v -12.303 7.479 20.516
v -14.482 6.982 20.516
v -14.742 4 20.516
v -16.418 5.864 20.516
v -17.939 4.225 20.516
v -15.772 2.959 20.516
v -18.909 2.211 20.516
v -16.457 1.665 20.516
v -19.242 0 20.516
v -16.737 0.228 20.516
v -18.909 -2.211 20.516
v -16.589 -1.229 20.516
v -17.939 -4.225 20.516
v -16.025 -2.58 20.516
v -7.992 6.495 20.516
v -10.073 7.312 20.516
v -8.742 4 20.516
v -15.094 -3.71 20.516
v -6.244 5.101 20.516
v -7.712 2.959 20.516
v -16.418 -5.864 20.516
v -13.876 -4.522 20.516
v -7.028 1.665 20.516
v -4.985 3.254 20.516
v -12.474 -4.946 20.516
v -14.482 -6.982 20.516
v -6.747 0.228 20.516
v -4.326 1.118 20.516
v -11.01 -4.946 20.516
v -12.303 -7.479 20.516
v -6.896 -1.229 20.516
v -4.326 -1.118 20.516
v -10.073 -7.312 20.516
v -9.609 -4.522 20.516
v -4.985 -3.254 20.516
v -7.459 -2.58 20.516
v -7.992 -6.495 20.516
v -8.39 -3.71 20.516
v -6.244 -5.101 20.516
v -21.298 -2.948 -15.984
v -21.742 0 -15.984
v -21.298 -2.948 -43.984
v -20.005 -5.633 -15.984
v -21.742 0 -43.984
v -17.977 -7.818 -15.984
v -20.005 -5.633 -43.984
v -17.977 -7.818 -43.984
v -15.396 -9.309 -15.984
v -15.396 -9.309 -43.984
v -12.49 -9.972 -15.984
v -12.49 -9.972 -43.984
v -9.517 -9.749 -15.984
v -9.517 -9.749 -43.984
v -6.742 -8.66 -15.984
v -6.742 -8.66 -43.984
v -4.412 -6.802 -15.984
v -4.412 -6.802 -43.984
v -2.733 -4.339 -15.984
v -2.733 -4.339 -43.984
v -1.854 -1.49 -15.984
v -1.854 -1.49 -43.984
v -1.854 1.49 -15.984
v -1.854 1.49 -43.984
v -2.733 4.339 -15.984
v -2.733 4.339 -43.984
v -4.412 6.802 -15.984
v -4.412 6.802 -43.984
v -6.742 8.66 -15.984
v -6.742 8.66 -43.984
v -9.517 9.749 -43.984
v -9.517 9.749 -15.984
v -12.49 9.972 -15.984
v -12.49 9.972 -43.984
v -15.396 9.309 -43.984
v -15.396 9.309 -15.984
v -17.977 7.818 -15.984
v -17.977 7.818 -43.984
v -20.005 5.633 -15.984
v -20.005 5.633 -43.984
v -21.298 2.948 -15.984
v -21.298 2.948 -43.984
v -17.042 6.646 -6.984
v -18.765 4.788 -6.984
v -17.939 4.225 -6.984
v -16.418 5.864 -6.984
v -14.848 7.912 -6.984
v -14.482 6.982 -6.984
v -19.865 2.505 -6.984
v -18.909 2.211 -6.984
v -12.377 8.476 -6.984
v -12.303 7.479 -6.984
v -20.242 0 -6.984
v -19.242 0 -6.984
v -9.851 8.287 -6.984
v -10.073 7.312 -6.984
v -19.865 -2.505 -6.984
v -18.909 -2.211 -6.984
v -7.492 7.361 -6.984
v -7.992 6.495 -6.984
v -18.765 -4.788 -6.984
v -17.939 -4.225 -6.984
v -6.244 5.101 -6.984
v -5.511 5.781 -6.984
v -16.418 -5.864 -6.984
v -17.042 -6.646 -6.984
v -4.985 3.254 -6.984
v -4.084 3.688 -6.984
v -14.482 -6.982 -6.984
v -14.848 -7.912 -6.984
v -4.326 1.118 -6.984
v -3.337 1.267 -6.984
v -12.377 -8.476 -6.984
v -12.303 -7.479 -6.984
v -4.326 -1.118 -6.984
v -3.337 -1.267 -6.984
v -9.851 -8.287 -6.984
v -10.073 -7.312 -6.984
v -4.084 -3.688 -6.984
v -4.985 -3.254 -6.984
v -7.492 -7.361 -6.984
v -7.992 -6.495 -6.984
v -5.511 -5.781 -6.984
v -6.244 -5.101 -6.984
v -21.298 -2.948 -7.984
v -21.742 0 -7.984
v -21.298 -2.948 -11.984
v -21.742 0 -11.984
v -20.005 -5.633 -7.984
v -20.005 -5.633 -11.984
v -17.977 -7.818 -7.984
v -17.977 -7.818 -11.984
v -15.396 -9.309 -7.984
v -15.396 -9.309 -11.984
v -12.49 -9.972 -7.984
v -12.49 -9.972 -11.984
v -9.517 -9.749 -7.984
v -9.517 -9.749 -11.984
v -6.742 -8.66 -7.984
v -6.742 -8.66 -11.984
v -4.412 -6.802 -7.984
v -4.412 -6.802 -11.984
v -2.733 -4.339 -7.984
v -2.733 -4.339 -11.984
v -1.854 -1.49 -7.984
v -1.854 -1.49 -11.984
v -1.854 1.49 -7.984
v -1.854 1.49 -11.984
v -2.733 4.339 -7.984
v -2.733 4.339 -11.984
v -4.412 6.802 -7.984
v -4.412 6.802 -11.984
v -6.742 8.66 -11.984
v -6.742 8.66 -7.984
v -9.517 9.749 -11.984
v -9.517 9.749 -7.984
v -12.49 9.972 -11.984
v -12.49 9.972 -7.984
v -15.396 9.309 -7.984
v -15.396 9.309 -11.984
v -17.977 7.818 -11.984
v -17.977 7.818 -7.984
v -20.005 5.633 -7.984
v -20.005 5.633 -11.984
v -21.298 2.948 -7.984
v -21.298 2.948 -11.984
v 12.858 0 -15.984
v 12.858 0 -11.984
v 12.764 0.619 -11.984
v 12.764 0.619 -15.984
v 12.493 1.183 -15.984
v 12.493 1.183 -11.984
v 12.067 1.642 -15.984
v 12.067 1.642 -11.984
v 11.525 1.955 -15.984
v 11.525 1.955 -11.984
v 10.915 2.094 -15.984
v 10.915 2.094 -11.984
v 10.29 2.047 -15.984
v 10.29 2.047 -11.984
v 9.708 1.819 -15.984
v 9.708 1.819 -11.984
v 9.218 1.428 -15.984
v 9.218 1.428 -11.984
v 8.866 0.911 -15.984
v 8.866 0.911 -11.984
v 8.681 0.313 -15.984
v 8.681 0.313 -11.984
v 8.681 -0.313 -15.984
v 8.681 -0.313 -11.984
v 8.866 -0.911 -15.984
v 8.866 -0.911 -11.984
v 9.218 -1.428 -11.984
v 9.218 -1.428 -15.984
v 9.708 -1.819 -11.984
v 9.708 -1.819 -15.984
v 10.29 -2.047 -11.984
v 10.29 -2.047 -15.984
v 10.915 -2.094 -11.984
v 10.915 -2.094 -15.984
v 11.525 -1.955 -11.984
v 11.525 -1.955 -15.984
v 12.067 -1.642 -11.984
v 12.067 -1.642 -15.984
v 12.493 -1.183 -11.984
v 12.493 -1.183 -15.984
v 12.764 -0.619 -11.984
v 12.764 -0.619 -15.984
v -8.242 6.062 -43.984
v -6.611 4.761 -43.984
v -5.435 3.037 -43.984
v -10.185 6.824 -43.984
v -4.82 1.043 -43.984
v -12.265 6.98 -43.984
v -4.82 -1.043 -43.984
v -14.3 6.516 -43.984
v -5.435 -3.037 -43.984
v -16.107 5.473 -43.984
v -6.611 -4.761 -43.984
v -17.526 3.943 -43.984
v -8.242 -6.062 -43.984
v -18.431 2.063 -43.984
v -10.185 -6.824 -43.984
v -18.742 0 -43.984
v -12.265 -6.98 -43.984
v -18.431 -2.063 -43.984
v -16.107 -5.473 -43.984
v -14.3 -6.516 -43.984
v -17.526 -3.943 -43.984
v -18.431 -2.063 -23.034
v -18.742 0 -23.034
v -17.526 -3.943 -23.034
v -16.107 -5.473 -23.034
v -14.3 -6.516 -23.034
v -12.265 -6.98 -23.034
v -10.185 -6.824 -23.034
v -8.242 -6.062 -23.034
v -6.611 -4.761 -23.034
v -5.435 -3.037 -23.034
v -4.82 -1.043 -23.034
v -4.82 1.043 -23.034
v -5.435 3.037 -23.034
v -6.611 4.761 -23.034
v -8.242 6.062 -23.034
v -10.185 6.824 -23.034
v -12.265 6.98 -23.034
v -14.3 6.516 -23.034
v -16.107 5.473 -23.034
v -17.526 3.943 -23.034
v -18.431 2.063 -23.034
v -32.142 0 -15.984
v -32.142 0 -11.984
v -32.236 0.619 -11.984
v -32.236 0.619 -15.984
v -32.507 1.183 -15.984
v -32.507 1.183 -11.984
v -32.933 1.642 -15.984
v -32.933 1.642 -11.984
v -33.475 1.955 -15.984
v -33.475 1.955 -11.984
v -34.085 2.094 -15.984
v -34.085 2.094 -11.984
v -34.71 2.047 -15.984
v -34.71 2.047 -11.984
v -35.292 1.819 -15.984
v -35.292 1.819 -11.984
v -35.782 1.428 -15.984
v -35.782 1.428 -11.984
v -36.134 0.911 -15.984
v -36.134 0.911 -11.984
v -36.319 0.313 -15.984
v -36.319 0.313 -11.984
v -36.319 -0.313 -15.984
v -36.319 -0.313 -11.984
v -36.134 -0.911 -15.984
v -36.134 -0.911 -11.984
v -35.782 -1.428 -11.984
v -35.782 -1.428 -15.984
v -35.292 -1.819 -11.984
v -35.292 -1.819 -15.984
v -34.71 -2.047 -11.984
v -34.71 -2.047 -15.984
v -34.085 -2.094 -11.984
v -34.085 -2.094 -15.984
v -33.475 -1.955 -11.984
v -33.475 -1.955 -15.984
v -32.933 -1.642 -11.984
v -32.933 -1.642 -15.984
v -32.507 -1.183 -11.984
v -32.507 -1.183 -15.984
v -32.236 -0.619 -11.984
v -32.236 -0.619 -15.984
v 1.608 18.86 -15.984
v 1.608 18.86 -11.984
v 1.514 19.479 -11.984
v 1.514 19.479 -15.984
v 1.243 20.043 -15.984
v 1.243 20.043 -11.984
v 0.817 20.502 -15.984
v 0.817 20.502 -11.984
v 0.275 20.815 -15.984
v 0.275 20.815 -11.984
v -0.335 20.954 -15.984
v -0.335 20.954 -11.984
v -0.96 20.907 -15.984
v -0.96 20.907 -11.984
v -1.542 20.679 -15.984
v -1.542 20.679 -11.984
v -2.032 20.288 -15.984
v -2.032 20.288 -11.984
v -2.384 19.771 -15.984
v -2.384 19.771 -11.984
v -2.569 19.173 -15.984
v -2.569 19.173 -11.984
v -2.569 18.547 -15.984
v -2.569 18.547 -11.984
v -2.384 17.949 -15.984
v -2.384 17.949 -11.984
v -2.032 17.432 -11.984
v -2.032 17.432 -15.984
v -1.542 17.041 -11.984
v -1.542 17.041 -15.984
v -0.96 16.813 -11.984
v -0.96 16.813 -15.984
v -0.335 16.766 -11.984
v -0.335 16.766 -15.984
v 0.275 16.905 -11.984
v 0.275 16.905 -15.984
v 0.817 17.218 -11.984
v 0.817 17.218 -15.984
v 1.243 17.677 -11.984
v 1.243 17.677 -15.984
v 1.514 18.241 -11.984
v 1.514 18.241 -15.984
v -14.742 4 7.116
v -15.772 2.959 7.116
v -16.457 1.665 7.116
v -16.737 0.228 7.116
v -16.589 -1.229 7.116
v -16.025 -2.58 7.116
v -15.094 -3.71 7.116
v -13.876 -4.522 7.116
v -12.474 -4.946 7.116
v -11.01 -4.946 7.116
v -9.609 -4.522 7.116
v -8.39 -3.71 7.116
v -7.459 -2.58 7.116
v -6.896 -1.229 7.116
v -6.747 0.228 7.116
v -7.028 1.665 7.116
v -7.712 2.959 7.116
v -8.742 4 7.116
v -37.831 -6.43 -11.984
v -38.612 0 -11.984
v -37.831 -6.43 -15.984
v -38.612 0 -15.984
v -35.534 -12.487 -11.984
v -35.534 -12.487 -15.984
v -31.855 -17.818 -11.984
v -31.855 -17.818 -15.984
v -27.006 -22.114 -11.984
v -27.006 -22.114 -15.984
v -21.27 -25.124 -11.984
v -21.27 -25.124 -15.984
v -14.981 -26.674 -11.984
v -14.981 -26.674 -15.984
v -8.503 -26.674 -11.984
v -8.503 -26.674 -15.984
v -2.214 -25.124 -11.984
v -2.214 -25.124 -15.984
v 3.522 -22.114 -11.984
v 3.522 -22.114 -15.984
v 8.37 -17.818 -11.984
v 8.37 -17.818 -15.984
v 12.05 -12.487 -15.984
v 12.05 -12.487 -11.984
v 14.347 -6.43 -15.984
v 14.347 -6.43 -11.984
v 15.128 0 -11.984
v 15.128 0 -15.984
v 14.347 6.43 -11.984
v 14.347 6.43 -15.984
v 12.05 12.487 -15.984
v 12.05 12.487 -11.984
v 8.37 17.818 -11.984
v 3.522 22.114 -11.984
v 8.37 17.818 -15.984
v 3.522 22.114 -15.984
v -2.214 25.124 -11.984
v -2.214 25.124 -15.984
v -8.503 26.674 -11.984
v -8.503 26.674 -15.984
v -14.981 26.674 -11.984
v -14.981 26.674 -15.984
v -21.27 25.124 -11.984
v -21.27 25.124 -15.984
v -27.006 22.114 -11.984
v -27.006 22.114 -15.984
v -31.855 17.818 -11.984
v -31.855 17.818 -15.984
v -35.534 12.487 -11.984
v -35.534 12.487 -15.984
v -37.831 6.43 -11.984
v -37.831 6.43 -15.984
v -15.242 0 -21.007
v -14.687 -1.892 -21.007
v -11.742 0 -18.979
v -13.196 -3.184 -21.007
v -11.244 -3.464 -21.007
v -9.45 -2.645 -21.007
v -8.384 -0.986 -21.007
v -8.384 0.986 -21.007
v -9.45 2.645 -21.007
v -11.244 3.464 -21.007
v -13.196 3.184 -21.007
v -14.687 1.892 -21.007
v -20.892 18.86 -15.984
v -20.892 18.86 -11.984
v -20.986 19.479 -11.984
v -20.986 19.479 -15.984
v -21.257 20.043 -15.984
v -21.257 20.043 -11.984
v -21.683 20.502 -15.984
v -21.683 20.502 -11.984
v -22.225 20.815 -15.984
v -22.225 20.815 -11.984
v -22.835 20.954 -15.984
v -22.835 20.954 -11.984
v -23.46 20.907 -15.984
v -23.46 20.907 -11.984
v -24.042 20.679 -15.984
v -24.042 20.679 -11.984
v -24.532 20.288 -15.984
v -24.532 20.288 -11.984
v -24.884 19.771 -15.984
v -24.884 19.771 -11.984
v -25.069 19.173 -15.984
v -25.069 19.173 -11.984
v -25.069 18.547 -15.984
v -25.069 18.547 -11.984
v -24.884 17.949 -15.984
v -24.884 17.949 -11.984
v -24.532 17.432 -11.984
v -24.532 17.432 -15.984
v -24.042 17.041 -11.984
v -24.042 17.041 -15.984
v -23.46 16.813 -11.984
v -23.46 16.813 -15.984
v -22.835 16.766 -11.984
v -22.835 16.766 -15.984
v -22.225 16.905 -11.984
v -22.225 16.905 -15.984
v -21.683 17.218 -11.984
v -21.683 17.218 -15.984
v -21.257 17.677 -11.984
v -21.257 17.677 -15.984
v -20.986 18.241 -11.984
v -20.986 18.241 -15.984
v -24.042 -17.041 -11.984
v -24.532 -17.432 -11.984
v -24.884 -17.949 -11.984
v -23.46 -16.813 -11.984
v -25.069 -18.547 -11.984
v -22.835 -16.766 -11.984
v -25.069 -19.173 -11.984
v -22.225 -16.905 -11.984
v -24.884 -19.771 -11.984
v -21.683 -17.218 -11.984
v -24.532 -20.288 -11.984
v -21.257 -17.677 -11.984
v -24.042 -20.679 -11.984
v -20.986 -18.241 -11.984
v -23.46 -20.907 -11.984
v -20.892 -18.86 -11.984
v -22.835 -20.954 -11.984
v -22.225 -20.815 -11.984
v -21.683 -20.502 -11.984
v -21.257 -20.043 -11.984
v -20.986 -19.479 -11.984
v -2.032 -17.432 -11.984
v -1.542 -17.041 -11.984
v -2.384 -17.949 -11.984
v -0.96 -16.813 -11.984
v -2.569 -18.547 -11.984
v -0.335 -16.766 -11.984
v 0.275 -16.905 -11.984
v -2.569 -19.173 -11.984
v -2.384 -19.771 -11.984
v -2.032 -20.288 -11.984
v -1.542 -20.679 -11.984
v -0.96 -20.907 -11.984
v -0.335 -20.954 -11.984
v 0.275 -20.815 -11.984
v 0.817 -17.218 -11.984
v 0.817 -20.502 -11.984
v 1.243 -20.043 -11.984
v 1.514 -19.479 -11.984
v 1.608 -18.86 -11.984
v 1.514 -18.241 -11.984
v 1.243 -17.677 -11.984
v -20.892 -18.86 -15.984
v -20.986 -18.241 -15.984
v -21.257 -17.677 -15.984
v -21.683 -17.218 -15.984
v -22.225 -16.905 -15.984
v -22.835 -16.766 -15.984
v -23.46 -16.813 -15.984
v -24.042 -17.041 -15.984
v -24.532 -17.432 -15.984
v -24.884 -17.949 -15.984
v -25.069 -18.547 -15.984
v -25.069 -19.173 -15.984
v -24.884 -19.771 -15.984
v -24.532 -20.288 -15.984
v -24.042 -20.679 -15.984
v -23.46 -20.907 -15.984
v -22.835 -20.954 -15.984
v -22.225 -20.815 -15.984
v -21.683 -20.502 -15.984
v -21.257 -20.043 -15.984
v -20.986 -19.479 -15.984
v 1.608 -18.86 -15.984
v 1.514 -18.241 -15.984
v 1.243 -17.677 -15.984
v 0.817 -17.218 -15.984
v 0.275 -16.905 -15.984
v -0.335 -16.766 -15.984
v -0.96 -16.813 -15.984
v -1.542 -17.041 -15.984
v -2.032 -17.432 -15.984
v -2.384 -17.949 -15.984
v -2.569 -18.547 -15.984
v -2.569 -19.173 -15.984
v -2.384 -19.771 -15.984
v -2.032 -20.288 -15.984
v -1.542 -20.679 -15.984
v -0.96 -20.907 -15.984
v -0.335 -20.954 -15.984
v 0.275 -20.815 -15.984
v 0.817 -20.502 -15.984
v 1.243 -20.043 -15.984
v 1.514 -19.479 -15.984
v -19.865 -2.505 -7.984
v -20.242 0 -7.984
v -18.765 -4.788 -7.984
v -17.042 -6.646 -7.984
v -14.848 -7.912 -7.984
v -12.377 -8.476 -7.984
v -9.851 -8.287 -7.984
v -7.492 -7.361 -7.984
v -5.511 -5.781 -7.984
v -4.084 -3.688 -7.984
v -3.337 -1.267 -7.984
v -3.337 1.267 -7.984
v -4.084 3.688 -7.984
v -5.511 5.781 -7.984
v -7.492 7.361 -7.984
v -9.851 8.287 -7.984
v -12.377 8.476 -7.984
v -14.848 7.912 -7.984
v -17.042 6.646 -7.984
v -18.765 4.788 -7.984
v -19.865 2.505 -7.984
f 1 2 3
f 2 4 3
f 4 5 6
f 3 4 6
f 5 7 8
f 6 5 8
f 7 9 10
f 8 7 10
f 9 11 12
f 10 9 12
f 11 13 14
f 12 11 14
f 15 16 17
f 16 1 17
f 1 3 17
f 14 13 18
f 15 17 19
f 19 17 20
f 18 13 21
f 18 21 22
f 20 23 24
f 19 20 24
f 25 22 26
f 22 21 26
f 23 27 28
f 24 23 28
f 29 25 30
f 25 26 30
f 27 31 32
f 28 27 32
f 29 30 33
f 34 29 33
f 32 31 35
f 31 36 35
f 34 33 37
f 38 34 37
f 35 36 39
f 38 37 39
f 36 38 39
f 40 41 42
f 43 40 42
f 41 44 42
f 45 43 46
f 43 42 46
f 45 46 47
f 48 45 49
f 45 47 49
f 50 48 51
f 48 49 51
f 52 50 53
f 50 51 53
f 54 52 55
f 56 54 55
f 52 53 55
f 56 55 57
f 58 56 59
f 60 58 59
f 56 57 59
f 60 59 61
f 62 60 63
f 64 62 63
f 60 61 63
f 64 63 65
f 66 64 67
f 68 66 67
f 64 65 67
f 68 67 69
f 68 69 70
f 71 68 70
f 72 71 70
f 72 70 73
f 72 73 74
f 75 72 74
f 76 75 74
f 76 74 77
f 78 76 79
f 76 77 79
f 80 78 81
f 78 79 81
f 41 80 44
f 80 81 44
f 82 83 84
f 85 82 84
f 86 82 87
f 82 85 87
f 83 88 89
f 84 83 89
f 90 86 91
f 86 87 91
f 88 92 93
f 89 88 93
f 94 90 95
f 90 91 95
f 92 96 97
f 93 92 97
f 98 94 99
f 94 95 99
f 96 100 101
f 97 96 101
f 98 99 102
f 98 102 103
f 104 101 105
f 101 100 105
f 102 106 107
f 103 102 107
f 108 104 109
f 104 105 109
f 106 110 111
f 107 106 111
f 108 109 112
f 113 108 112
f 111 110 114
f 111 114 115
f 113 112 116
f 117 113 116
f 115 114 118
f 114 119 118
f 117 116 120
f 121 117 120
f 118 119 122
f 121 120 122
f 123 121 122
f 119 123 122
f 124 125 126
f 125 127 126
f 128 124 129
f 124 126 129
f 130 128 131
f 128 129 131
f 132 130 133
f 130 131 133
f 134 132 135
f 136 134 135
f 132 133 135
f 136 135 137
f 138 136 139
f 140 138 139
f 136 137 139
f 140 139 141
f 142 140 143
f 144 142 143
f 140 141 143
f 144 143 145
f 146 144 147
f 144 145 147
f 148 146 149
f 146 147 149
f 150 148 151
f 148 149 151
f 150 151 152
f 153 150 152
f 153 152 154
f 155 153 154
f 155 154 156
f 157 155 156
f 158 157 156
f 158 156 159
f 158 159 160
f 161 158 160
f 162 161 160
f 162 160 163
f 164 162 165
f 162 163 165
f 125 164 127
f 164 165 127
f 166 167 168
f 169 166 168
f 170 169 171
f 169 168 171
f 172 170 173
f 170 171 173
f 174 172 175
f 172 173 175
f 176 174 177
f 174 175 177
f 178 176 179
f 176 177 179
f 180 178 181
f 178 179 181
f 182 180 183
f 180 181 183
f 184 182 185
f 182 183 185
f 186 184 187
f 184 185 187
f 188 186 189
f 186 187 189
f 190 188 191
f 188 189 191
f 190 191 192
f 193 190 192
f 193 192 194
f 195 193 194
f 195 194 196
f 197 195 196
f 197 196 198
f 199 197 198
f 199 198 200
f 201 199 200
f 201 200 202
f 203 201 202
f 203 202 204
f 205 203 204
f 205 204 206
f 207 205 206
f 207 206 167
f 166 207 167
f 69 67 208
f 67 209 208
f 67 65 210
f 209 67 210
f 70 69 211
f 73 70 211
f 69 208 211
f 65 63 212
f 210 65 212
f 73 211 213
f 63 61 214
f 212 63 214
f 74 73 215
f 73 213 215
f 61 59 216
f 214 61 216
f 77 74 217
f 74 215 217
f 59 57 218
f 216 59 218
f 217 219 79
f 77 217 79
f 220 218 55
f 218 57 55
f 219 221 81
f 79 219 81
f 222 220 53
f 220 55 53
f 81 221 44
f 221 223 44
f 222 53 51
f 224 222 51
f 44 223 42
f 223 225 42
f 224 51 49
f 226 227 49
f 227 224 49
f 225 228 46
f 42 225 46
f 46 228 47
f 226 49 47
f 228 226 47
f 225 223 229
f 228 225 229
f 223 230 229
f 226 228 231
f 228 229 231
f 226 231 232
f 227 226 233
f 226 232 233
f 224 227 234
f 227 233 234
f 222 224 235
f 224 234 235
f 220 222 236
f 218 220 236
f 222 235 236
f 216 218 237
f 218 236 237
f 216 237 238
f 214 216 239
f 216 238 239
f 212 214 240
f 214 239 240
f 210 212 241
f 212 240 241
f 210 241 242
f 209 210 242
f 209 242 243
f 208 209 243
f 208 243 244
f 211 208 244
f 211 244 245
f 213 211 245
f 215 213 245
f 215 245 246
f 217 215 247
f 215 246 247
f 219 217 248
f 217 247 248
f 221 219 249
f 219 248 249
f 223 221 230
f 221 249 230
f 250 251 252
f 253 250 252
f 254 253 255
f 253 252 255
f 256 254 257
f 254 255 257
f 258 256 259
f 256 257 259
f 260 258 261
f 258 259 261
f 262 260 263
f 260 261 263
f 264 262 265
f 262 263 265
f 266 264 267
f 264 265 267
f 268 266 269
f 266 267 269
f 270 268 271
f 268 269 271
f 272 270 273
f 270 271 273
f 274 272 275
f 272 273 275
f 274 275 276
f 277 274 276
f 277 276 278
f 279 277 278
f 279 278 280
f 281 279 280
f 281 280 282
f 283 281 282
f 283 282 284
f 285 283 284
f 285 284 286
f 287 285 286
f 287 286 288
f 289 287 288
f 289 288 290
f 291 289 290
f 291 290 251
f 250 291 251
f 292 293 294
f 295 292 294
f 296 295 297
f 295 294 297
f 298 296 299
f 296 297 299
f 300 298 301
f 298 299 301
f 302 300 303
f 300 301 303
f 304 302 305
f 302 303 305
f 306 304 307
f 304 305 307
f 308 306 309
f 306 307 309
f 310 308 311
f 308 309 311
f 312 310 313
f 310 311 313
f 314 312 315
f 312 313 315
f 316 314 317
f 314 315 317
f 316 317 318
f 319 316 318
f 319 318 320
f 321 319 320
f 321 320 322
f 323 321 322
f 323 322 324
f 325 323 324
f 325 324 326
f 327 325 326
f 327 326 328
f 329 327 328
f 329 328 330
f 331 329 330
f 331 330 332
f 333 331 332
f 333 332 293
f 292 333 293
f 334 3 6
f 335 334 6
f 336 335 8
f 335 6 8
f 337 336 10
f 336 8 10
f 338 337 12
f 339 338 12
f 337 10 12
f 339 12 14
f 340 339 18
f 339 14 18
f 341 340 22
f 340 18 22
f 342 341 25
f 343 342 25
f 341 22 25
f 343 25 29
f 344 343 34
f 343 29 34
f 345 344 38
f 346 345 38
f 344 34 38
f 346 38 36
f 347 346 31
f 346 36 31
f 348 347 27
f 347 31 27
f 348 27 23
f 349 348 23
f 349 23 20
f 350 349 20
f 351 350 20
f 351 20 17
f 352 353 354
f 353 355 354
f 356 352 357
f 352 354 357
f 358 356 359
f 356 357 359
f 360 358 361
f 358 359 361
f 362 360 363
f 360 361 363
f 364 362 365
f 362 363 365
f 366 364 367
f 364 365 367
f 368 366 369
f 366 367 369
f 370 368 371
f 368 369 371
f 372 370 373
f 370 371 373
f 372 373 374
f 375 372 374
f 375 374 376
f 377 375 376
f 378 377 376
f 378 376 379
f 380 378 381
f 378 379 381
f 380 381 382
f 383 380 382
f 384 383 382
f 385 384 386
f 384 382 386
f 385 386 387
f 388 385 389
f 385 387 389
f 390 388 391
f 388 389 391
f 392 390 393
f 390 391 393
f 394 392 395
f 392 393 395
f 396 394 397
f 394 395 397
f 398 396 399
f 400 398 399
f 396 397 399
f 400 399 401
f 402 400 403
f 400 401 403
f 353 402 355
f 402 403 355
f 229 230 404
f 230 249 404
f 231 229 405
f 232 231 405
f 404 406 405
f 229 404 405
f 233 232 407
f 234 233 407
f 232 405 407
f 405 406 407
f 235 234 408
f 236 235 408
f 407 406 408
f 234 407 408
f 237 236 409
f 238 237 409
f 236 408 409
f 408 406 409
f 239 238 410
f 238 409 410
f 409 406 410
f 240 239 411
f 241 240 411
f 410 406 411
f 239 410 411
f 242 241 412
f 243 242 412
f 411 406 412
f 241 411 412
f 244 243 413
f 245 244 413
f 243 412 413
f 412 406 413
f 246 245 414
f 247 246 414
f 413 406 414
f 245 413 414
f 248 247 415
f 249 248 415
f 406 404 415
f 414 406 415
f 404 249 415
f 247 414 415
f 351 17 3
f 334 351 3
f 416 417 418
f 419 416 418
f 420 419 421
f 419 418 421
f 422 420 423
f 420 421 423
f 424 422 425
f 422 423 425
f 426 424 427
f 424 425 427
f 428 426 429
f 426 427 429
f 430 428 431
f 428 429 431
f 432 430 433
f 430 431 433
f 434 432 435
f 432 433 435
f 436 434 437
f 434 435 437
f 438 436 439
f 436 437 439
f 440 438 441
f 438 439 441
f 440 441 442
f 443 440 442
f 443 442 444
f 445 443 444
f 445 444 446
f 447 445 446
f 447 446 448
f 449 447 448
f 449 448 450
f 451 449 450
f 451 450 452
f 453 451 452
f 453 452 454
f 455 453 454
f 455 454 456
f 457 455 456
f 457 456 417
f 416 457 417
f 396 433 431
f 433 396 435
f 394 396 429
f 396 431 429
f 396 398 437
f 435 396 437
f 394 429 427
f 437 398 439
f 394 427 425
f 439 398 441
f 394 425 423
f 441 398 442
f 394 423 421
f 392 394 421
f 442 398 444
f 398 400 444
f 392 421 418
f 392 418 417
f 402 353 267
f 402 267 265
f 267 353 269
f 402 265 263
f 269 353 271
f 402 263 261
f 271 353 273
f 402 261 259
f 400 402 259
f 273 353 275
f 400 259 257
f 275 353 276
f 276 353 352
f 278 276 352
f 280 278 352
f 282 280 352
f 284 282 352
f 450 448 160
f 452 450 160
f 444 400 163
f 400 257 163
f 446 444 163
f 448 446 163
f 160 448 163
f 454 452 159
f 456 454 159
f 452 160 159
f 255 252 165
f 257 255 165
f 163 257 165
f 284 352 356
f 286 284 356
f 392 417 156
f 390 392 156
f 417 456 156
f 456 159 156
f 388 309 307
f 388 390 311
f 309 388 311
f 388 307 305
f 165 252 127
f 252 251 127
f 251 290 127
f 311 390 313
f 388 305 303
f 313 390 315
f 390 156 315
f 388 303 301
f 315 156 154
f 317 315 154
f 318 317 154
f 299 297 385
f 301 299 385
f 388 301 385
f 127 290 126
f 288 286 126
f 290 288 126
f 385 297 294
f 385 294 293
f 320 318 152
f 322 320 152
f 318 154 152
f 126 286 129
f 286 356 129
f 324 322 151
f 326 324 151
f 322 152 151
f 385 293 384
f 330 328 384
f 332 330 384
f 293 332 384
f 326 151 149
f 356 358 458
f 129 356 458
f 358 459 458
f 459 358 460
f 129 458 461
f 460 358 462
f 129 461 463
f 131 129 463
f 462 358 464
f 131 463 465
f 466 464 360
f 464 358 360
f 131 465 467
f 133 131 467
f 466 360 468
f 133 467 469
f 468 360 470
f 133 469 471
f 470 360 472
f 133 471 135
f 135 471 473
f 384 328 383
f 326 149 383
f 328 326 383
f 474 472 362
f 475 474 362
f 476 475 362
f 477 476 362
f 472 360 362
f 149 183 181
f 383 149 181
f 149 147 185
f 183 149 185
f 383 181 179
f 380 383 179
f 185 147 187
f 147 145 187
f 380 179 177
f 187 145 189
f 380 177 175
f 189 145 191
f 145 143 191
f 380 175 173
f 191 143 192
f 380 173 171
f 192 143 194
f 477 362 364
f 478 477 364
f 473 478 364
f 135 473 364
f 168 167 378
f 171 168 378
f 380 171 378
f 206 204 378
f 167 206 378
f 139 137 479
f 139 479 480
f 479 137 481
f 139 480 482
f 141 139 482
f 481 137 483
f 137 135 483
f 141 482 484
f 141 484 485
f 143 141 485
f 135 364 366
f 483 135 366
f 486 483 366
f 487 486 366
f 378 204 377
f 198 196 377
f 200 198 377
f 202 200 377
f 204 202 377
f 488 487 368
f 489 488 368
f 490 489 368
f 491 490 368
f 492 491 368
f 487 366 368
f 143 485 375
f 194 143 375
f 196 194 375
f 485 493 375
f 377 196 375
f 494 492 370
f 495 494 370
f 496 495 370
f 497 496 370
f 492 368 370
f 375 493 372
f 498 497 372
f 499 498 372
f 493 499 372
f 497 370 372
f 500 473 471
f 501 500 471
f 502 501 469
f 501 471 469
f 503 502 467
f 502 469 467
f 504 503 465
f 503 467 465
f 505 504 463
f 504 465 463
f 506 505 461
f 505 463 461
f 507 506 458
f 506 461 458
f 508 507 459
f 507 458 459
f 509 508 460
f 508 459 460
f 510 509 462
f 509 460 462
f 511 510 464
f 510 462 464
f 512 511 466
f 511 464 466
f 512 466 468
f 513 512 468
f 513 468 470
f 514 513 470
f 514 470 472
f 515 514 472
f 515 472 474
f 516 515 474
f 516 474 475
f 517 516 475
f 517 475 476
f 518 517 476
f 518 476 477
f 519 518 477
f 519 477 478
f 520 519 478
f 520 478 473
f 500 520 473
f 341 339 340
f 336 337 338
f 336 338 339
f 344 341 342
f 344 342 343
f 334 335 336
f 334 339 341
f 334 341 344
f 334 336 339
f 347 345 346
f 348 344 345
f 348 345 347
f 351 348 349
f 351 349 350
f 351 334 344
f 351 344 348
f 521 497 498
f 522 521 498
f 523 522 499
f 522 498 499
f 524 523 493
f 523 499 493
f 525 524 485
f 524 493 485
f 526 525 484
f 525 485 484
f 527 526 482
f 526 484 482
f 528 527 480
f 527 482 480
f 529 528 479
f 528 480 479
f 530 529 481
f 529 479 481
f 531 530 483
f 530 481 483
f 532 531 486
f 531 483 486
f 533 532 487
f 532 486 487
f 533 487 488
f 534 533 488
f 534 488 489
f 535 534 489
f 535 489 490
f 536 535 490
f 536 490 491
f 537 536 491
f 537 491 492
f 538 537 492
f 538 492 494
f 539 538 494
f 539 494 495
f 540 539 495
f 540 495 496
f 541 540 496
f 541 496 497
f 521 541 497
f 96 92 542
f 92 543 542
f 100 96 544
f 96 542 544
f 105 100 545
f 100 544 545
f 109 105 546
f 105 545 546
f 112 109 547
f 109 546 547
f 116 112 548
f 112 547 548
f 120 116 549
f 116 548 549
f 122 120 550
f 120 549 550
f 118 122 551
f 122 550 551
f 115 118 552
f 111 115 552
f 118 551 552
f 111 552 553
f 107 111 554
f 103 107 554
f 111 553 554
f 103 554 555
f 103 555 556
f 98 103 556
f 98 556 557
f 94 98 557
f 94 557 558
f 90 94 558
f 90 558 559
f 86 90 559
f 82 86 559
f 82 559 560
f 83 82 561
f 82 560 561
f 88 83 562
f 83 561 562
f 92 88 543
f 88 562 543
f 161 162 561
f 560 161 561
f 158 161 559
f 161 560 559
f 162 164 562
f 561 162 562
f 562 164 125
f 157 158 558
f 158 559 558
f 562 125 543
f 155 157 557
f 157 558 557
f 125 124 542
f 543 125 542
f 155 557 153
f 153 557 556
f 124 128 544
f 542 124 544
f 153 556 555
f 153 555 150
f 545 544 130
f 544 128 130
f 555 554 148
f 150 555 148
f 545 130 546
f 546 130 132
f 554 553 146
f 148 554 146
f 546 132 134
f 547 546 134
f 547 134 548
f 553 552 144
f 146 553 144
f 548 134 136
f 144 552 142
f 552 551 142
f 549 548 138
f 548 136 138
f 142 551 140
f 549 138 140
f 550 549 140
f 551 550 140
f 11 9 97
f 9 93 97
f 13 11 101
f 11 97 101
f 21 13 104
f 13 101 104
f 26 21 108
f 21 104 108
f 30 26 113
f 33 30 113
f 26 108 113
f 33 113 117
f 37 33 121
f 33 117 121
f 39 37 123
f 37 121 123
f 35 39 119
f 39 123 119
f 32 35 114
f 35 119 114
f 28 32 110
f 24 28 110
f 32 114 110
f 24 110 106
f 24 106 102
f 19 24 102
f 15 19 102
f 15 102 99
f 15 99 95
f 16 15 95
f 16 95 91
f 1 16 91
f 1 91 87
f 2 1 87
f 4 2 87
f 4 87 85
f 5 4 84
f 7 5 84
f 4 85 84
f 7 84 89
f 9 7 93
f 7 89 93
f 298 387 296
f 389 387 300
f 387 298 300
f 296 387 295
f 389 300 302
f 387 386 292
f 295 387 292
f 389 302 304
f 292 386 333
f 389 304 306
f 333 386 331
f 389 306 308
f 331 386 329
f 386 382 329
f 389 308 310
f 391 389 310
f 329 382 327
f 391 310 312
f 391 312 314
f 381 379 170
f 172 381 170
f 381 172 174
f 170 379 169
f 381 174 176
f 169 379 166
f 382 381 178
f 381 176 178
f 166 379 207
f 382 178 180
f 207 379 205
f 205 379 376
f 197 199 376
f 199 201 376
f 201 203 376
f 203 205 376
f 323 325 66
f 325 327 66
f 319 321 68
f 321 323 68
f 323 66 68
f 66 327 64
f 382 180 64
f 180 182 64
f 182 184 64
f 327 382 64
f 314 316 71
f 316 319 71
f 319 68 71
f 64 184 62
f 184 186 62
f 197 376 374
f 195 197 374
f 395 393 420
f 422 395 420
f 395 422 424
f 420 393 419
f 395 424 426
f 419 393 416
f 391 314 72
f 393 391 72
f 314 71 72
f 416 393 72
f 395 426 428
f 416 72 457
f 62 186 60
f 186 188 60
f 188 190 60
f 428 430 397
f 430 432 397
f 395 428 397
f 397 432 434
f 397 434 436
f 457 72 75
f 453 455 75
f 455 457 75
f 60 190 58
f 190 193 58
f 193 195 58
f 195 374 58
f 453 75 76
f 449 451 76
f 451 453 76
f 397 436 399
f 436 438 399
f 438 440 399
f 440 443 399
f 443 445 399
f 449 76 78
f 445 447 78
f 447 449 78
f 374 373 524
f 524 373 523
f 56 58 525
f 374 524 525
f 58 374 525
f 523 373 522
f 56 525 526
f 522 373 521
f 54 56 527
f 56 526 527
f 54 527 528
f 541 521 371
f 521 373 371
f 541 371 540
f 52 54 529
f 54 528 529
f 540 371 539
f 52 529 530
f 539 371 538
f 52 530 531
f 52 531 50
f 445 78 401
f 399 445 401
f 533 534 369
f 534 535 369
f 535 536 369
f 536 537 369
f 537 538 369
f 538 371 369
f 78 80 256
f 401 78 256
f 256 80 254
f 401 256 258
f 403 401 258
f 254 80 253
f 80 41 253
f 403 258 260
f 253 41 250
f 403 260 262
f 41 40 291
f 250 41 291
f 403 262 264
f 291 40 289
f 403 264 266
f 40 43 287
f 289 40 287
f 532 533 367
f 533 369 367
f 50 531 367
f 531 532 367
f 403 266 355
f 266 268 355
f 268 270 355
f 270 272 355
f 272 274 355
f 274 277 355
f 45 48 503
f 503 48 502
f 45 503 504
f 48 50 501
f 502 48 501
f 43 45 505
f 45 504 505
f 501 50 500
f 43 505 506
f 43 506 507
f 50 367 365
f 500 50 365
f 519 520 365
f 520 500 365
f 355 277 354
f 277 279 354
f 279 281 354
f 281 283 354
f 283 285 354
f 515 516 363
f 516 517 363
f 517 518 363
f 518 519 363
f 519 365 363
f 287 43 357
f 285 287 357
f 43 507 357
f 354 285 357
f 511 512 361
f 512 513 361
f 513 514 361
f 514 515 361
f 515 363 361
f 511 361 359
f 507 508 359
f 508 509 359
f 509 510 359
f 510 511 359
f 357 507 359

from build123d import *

# Parameters (mm, degrees)
CUT_EXTRUDE_1_DEPTH = 13.4
SKETCH_4_R          = 2.1
CUT_EXTRUDE_2_DEPTH = 13.4


with BuildPart() as part:
    # 草图2 → 旋转1 (revolve)
    with BuildSketch(Plane(origin=(0, 0, 0), x_dir=(1, 0, 0), z_dir=(0, 1, 0))):
        Polygon((-21.742218247, 43.984257603), (-18.742218247, 43.984257603), (-18.742218247, 23.034257603), (-11.742218247, 18.979304476), (-11.742218247, -20.515742397), (-19.242218247, -20.515742397), (-19.242218247, 6.984257603), (-20.242218247, 6.984257603), (-20.242218247, 7.984257603), (-21.742218247, 7.984257603), (-21.742218247, 11.984257603), (-38.612218247, 11.984257603), (-38.612218247, 15.984257603), (-21.742218247, 15.984257603), align=None)
    revolve(axis=Axis((-11.742218247, 0, -18.979304476), (0, 0, 1)))

    # 草图3 → 切除-拉伸1 (cut)
    with BuildSketch(Plane.XY.offset(20.515742397)):
        with BuildLine():
            Line((-11.742218247, 4), (-14.742218247, 4))
            ThreePointArc((-14.742218247, 4), (-11.742218247, -5), (-8.742218247, 4))
            Line((-8.742218247, 4), (-11.742218247, 4))
        make_face()
    extrude(amount=-CUT_EXTRUDE_1_DEPTH, mode=Mode.SUBTRACT)

    # 草图4 → 切除-拉伸2 (cut)
    with BuildSketch(Plane.XY.offset(-11.984257603)):
        with Locations((-0.492218247, -18.86)):
            Circle(SKETCH_4_R)
        with Locations((10.757781753, 0)):
            Circle(SKETCH_4_R)
        with Locations((-22.992218247, -18.86)):
            Circle(SKETCH_4_R)
        with Locations((-34.242218247, 0)):
            Circle(SKETCH_4_R)
        with Locations((-22.992218247, 18.86)):
            Circle(SKETCH_4_R)
        with Locations((-0.492218247, 18.86)):
            Circle(SKETCH_4_R)
    extrude(amount=-CUT_EXTRUDE_2_DEPTH, mode=Mode.SUBTRACT)


solid = part.part
